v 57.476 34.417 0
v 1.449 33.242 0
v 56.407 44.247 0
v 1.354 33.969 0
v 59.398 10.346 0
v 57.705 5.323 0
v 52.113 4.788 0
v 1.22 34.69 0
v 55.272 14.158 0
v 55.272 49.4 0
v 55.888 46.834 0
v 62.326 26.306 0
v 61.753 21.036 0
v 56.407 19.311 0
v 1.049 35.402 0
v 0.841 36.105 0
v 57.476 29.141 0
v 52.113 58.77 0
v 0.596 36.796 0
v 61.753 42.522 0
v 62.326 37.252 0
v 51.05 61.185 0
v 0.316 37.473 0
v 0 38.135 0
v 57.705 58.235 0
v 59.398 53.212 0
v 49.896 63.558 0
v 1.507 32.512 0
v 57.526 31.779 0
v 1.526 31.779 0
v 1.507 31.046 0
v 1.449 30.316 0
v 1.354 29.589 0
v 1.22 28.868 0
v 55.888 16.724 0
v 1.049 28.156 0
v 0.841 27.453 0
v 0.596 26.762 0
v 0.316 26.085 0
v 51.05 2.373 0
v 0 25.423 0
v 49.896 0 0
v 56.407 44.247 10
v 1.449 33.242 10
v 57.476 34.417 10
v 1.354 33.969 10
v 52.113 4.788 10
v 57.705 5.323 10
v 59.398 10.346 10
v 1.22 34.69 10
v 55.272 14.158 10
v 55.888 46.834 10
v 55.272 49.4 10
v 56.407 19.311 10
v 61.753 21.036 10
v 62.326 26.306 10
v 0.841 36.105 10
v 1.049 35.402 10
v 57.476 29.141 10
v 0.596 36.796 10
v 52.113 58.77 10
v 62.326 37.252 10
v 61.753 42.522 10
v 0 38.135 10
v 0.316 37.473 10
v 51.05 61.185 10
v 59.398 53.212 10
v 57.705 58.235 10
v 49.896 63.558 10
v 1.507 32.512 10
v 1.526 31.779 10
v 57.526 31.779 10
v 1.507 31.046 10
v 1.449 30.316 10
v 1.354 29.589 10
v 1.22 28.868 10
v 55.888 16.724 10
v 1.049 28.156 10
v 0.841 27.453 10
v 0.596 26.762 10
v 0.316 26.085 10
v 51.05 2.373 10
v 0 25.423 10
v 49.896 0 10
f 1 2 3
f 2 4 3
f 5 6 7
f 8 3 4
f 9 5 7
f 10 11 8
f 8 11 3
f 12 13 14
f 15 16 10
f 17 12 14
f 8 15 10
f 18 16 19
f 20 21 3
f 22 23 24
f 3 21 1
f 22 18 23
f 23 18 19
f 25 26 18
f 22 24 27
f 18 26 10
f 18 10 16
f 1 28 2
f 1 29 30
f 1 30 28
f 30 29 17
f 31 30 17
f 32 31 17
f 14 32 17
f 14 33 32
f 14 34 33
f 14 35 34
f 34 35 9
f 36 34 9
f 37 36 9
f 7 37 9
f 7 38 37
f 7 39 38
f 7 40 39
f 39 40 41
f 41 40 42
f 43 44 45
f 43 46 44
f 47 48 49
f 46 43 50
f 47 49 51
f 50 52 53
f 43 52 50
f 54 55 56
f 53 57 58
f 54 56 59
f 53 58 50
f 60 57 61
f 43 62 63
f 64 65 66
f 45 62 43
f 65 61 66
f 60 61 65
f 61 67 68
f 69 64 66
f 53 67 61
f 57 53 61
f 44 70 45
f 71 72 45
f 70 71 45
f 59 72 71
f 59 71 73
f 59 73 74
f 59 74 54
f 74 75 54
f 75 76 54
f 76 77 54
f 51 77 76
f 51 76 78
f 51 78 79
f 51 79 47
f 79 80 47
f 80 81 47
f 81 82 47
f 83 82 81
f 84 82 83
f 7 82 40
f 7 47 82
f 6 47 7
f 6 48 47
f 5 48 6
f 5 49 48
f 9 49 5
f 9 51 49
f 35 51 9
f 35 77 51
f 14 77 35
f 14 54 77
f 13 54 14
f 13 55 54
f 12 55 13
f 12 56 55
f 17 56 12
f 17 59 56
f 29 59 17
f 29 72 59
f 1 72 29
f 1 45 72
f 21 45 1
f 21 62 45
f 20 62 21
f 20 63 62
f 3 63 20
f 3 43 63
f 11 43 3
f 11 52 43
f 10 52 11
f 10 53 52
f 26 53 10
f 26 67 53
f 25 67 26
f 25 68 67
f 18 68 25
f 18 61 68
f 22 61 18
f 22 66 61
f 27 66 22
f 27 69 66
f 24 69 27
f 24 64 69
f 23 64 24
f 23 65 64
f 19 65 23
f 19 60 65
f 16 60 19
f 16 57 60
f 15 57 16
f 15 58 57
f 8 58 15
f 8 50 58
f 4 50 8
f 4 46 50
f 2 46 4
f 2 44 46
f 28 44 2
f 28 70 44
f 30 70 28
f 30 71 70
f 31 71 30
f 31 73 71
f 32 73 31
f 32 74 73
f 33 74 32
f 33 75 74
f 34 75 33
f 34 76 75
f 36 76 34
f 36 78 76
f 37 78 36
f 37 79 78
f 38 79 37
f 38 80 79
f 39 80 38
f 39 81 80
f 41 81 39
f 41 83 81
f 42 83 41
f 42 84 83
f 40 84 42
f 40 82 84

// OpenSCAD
$fn = 32;

// ----------------------------------------------------------------------
// Gear sector: 4 teeth on 54 degrees
// ----------------------------------------------------------------------

// --- parameters (mm) ---
sector_angle = 54;        // sector angle, degrees
root_r = 70;              // root circle radius
tooth_h = 5;              // tooth height over the root circle
teeth = 4;                // number of teeth on the sector
hub_r = 14;               // hub bore radius
plate_t = 10;             // sector thickness, Z
arc_step = 3;             // sampling step of the root/hub arcs, degrees

tip_r = root_r + tooth_h;  // tip circle radius

profile = [[49.896, 0], [51.05, 2.373], [52.113, 4.788], [57.705, 5.323], [59.398, 10.346], [55.272, 14.158], [55.888, 16.724], [56.407, 19.311], [61.753, 21.036], [62.326, 26.306], [57.476, 29.141], [57.526, 31.779], [57.476, 34.417], [62.326, 37.252], [61.753, 42.522], [56.407, 44.247], [55.888, 46.834], [55.272, 49.4], [59.398, 53.212], [57.705, 58.235], [52.113, 58.77], [51.05, 61.185], [49.896, 63.558], [0, 38.135], [0.316, 37.473], [0.596, 36.796], [0.841, 36.105], [1.049, 35.402], [1.22, 34.69], [1.354, 33.969], [1.449, 33.242], [1.507, 32.512], [1.526, 31.779], [1.507, 31.046], [1.449, 30.316], [1.354, 29.589], [1.22, 28.868], [1.049, 28.156], [0.841, 27.453], [0.596, 26.762], [0.316, 26.085], [0, 25.423]];  // primary outline, 42 points, counter clockwise

// --- the one profile operation ---
linear_extrude(height = plate_t) polygon(points = profile);
